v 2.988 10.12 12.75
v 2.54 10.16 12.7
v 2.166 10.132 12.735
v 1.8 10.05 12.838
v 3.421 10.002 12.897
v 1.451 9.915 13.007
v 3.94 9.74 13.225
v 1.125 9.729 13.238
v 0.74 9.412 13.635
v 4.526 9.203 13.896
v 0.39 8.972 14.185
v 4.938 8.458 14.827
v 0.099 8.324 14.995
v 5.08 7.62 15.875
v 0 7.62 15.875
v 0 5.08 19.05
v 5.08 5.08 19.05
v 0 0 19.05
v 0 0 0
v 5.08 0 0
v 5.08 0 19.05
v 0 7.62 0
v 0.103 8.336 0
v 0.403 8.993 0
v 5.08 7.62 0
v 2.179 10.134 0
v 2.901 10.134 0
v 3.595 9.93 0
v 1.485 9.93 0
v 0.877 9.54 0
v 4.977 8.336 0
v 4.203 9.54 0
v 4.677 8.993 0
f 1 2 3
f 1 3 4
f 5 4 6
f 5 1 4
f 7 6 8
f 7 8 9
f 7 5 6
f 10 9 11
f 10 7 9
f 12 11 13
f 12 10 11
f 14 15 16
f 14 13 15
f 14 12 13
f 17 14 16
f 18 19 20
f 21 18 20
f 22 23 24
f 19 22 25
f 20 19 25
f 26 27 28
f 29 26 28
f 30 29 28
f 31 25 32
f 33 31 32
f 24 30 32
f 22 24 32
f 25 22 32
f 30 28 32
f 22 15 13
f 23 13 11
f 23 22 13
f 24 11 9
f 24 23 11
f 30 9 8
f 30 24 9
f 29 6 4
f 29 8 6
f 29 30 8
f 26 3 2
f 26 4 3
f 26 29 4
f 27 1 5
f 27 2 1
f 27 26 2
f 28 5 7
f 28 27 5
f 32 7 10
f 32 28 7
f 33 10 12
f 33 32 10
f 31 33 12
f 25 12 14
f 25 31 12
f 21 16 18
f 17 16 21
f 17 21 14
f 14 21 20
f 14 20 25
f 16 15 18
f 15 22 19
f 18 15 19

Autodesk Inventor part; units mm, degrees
ref_plane "YZ Plane" through (0, 0, 0) normal (1, 0, 0) x (0, 1, 0)
ref_plane "XZ Plane" through (0, 0, 0) normal (0, 1, 0) x (-1, 0, 0)
ref_plane "XY Plane" through (0, 0, 0) normal (0, 0, 1) x (1, 0, 0)
sketch "Sketch1" plane through (0, 0, 0) normal (0, 0, 1) x (1, 0, 0)
  line L0 (0, 0) -> (5.08, 0)
  line L1 (5.08, 0) -> (5.08, 7.62)
  line L2 (0, 7.62) -> (0, 0)
  arc A0 (5.08, 7.62) -> (0, 7.62) centre (2.54, 7.62) ccw
  dimension "d0" = 5.08
  dimension "d1" = 7.62
extrude "Extrusion1" add sketch "Sketch1" along normal blind 19.05
sketch "Sketch2" plane through (5.08, 0, 0) normal (1, 0, 0) x (0, 0, -1)
  line L0 (-19.05, 7.62) -> (-19.05, 0) projected
  line L1 (0, 0) -> (0, 7.62) projected
  line L2 (0, 7.62) -> (-19.05, 7.62) projected
  line L3 (0, 7.62) -> (0, 10.16)
  line L4 (0, 10.16) -> (-12.7, 10.16)
  line L5 (-12.7, 10.16) -> (-19.05, 5.08)
  line L6 (-19.05, 5.08) -> (-19.05, 10.16)
  line L7 (-19.05, 10.16) -> (-12.7, 10.16)
  dimension "d4" = 12.7
  dimension "d5" = 5.08
  dimension "d6" = 2.54
extrude "Extrusion2" cut sketch "Sketch2" against normal through all contours L2 L5 L0 | L6 L7 L5 L2
properties part number "tensioning wedge"
